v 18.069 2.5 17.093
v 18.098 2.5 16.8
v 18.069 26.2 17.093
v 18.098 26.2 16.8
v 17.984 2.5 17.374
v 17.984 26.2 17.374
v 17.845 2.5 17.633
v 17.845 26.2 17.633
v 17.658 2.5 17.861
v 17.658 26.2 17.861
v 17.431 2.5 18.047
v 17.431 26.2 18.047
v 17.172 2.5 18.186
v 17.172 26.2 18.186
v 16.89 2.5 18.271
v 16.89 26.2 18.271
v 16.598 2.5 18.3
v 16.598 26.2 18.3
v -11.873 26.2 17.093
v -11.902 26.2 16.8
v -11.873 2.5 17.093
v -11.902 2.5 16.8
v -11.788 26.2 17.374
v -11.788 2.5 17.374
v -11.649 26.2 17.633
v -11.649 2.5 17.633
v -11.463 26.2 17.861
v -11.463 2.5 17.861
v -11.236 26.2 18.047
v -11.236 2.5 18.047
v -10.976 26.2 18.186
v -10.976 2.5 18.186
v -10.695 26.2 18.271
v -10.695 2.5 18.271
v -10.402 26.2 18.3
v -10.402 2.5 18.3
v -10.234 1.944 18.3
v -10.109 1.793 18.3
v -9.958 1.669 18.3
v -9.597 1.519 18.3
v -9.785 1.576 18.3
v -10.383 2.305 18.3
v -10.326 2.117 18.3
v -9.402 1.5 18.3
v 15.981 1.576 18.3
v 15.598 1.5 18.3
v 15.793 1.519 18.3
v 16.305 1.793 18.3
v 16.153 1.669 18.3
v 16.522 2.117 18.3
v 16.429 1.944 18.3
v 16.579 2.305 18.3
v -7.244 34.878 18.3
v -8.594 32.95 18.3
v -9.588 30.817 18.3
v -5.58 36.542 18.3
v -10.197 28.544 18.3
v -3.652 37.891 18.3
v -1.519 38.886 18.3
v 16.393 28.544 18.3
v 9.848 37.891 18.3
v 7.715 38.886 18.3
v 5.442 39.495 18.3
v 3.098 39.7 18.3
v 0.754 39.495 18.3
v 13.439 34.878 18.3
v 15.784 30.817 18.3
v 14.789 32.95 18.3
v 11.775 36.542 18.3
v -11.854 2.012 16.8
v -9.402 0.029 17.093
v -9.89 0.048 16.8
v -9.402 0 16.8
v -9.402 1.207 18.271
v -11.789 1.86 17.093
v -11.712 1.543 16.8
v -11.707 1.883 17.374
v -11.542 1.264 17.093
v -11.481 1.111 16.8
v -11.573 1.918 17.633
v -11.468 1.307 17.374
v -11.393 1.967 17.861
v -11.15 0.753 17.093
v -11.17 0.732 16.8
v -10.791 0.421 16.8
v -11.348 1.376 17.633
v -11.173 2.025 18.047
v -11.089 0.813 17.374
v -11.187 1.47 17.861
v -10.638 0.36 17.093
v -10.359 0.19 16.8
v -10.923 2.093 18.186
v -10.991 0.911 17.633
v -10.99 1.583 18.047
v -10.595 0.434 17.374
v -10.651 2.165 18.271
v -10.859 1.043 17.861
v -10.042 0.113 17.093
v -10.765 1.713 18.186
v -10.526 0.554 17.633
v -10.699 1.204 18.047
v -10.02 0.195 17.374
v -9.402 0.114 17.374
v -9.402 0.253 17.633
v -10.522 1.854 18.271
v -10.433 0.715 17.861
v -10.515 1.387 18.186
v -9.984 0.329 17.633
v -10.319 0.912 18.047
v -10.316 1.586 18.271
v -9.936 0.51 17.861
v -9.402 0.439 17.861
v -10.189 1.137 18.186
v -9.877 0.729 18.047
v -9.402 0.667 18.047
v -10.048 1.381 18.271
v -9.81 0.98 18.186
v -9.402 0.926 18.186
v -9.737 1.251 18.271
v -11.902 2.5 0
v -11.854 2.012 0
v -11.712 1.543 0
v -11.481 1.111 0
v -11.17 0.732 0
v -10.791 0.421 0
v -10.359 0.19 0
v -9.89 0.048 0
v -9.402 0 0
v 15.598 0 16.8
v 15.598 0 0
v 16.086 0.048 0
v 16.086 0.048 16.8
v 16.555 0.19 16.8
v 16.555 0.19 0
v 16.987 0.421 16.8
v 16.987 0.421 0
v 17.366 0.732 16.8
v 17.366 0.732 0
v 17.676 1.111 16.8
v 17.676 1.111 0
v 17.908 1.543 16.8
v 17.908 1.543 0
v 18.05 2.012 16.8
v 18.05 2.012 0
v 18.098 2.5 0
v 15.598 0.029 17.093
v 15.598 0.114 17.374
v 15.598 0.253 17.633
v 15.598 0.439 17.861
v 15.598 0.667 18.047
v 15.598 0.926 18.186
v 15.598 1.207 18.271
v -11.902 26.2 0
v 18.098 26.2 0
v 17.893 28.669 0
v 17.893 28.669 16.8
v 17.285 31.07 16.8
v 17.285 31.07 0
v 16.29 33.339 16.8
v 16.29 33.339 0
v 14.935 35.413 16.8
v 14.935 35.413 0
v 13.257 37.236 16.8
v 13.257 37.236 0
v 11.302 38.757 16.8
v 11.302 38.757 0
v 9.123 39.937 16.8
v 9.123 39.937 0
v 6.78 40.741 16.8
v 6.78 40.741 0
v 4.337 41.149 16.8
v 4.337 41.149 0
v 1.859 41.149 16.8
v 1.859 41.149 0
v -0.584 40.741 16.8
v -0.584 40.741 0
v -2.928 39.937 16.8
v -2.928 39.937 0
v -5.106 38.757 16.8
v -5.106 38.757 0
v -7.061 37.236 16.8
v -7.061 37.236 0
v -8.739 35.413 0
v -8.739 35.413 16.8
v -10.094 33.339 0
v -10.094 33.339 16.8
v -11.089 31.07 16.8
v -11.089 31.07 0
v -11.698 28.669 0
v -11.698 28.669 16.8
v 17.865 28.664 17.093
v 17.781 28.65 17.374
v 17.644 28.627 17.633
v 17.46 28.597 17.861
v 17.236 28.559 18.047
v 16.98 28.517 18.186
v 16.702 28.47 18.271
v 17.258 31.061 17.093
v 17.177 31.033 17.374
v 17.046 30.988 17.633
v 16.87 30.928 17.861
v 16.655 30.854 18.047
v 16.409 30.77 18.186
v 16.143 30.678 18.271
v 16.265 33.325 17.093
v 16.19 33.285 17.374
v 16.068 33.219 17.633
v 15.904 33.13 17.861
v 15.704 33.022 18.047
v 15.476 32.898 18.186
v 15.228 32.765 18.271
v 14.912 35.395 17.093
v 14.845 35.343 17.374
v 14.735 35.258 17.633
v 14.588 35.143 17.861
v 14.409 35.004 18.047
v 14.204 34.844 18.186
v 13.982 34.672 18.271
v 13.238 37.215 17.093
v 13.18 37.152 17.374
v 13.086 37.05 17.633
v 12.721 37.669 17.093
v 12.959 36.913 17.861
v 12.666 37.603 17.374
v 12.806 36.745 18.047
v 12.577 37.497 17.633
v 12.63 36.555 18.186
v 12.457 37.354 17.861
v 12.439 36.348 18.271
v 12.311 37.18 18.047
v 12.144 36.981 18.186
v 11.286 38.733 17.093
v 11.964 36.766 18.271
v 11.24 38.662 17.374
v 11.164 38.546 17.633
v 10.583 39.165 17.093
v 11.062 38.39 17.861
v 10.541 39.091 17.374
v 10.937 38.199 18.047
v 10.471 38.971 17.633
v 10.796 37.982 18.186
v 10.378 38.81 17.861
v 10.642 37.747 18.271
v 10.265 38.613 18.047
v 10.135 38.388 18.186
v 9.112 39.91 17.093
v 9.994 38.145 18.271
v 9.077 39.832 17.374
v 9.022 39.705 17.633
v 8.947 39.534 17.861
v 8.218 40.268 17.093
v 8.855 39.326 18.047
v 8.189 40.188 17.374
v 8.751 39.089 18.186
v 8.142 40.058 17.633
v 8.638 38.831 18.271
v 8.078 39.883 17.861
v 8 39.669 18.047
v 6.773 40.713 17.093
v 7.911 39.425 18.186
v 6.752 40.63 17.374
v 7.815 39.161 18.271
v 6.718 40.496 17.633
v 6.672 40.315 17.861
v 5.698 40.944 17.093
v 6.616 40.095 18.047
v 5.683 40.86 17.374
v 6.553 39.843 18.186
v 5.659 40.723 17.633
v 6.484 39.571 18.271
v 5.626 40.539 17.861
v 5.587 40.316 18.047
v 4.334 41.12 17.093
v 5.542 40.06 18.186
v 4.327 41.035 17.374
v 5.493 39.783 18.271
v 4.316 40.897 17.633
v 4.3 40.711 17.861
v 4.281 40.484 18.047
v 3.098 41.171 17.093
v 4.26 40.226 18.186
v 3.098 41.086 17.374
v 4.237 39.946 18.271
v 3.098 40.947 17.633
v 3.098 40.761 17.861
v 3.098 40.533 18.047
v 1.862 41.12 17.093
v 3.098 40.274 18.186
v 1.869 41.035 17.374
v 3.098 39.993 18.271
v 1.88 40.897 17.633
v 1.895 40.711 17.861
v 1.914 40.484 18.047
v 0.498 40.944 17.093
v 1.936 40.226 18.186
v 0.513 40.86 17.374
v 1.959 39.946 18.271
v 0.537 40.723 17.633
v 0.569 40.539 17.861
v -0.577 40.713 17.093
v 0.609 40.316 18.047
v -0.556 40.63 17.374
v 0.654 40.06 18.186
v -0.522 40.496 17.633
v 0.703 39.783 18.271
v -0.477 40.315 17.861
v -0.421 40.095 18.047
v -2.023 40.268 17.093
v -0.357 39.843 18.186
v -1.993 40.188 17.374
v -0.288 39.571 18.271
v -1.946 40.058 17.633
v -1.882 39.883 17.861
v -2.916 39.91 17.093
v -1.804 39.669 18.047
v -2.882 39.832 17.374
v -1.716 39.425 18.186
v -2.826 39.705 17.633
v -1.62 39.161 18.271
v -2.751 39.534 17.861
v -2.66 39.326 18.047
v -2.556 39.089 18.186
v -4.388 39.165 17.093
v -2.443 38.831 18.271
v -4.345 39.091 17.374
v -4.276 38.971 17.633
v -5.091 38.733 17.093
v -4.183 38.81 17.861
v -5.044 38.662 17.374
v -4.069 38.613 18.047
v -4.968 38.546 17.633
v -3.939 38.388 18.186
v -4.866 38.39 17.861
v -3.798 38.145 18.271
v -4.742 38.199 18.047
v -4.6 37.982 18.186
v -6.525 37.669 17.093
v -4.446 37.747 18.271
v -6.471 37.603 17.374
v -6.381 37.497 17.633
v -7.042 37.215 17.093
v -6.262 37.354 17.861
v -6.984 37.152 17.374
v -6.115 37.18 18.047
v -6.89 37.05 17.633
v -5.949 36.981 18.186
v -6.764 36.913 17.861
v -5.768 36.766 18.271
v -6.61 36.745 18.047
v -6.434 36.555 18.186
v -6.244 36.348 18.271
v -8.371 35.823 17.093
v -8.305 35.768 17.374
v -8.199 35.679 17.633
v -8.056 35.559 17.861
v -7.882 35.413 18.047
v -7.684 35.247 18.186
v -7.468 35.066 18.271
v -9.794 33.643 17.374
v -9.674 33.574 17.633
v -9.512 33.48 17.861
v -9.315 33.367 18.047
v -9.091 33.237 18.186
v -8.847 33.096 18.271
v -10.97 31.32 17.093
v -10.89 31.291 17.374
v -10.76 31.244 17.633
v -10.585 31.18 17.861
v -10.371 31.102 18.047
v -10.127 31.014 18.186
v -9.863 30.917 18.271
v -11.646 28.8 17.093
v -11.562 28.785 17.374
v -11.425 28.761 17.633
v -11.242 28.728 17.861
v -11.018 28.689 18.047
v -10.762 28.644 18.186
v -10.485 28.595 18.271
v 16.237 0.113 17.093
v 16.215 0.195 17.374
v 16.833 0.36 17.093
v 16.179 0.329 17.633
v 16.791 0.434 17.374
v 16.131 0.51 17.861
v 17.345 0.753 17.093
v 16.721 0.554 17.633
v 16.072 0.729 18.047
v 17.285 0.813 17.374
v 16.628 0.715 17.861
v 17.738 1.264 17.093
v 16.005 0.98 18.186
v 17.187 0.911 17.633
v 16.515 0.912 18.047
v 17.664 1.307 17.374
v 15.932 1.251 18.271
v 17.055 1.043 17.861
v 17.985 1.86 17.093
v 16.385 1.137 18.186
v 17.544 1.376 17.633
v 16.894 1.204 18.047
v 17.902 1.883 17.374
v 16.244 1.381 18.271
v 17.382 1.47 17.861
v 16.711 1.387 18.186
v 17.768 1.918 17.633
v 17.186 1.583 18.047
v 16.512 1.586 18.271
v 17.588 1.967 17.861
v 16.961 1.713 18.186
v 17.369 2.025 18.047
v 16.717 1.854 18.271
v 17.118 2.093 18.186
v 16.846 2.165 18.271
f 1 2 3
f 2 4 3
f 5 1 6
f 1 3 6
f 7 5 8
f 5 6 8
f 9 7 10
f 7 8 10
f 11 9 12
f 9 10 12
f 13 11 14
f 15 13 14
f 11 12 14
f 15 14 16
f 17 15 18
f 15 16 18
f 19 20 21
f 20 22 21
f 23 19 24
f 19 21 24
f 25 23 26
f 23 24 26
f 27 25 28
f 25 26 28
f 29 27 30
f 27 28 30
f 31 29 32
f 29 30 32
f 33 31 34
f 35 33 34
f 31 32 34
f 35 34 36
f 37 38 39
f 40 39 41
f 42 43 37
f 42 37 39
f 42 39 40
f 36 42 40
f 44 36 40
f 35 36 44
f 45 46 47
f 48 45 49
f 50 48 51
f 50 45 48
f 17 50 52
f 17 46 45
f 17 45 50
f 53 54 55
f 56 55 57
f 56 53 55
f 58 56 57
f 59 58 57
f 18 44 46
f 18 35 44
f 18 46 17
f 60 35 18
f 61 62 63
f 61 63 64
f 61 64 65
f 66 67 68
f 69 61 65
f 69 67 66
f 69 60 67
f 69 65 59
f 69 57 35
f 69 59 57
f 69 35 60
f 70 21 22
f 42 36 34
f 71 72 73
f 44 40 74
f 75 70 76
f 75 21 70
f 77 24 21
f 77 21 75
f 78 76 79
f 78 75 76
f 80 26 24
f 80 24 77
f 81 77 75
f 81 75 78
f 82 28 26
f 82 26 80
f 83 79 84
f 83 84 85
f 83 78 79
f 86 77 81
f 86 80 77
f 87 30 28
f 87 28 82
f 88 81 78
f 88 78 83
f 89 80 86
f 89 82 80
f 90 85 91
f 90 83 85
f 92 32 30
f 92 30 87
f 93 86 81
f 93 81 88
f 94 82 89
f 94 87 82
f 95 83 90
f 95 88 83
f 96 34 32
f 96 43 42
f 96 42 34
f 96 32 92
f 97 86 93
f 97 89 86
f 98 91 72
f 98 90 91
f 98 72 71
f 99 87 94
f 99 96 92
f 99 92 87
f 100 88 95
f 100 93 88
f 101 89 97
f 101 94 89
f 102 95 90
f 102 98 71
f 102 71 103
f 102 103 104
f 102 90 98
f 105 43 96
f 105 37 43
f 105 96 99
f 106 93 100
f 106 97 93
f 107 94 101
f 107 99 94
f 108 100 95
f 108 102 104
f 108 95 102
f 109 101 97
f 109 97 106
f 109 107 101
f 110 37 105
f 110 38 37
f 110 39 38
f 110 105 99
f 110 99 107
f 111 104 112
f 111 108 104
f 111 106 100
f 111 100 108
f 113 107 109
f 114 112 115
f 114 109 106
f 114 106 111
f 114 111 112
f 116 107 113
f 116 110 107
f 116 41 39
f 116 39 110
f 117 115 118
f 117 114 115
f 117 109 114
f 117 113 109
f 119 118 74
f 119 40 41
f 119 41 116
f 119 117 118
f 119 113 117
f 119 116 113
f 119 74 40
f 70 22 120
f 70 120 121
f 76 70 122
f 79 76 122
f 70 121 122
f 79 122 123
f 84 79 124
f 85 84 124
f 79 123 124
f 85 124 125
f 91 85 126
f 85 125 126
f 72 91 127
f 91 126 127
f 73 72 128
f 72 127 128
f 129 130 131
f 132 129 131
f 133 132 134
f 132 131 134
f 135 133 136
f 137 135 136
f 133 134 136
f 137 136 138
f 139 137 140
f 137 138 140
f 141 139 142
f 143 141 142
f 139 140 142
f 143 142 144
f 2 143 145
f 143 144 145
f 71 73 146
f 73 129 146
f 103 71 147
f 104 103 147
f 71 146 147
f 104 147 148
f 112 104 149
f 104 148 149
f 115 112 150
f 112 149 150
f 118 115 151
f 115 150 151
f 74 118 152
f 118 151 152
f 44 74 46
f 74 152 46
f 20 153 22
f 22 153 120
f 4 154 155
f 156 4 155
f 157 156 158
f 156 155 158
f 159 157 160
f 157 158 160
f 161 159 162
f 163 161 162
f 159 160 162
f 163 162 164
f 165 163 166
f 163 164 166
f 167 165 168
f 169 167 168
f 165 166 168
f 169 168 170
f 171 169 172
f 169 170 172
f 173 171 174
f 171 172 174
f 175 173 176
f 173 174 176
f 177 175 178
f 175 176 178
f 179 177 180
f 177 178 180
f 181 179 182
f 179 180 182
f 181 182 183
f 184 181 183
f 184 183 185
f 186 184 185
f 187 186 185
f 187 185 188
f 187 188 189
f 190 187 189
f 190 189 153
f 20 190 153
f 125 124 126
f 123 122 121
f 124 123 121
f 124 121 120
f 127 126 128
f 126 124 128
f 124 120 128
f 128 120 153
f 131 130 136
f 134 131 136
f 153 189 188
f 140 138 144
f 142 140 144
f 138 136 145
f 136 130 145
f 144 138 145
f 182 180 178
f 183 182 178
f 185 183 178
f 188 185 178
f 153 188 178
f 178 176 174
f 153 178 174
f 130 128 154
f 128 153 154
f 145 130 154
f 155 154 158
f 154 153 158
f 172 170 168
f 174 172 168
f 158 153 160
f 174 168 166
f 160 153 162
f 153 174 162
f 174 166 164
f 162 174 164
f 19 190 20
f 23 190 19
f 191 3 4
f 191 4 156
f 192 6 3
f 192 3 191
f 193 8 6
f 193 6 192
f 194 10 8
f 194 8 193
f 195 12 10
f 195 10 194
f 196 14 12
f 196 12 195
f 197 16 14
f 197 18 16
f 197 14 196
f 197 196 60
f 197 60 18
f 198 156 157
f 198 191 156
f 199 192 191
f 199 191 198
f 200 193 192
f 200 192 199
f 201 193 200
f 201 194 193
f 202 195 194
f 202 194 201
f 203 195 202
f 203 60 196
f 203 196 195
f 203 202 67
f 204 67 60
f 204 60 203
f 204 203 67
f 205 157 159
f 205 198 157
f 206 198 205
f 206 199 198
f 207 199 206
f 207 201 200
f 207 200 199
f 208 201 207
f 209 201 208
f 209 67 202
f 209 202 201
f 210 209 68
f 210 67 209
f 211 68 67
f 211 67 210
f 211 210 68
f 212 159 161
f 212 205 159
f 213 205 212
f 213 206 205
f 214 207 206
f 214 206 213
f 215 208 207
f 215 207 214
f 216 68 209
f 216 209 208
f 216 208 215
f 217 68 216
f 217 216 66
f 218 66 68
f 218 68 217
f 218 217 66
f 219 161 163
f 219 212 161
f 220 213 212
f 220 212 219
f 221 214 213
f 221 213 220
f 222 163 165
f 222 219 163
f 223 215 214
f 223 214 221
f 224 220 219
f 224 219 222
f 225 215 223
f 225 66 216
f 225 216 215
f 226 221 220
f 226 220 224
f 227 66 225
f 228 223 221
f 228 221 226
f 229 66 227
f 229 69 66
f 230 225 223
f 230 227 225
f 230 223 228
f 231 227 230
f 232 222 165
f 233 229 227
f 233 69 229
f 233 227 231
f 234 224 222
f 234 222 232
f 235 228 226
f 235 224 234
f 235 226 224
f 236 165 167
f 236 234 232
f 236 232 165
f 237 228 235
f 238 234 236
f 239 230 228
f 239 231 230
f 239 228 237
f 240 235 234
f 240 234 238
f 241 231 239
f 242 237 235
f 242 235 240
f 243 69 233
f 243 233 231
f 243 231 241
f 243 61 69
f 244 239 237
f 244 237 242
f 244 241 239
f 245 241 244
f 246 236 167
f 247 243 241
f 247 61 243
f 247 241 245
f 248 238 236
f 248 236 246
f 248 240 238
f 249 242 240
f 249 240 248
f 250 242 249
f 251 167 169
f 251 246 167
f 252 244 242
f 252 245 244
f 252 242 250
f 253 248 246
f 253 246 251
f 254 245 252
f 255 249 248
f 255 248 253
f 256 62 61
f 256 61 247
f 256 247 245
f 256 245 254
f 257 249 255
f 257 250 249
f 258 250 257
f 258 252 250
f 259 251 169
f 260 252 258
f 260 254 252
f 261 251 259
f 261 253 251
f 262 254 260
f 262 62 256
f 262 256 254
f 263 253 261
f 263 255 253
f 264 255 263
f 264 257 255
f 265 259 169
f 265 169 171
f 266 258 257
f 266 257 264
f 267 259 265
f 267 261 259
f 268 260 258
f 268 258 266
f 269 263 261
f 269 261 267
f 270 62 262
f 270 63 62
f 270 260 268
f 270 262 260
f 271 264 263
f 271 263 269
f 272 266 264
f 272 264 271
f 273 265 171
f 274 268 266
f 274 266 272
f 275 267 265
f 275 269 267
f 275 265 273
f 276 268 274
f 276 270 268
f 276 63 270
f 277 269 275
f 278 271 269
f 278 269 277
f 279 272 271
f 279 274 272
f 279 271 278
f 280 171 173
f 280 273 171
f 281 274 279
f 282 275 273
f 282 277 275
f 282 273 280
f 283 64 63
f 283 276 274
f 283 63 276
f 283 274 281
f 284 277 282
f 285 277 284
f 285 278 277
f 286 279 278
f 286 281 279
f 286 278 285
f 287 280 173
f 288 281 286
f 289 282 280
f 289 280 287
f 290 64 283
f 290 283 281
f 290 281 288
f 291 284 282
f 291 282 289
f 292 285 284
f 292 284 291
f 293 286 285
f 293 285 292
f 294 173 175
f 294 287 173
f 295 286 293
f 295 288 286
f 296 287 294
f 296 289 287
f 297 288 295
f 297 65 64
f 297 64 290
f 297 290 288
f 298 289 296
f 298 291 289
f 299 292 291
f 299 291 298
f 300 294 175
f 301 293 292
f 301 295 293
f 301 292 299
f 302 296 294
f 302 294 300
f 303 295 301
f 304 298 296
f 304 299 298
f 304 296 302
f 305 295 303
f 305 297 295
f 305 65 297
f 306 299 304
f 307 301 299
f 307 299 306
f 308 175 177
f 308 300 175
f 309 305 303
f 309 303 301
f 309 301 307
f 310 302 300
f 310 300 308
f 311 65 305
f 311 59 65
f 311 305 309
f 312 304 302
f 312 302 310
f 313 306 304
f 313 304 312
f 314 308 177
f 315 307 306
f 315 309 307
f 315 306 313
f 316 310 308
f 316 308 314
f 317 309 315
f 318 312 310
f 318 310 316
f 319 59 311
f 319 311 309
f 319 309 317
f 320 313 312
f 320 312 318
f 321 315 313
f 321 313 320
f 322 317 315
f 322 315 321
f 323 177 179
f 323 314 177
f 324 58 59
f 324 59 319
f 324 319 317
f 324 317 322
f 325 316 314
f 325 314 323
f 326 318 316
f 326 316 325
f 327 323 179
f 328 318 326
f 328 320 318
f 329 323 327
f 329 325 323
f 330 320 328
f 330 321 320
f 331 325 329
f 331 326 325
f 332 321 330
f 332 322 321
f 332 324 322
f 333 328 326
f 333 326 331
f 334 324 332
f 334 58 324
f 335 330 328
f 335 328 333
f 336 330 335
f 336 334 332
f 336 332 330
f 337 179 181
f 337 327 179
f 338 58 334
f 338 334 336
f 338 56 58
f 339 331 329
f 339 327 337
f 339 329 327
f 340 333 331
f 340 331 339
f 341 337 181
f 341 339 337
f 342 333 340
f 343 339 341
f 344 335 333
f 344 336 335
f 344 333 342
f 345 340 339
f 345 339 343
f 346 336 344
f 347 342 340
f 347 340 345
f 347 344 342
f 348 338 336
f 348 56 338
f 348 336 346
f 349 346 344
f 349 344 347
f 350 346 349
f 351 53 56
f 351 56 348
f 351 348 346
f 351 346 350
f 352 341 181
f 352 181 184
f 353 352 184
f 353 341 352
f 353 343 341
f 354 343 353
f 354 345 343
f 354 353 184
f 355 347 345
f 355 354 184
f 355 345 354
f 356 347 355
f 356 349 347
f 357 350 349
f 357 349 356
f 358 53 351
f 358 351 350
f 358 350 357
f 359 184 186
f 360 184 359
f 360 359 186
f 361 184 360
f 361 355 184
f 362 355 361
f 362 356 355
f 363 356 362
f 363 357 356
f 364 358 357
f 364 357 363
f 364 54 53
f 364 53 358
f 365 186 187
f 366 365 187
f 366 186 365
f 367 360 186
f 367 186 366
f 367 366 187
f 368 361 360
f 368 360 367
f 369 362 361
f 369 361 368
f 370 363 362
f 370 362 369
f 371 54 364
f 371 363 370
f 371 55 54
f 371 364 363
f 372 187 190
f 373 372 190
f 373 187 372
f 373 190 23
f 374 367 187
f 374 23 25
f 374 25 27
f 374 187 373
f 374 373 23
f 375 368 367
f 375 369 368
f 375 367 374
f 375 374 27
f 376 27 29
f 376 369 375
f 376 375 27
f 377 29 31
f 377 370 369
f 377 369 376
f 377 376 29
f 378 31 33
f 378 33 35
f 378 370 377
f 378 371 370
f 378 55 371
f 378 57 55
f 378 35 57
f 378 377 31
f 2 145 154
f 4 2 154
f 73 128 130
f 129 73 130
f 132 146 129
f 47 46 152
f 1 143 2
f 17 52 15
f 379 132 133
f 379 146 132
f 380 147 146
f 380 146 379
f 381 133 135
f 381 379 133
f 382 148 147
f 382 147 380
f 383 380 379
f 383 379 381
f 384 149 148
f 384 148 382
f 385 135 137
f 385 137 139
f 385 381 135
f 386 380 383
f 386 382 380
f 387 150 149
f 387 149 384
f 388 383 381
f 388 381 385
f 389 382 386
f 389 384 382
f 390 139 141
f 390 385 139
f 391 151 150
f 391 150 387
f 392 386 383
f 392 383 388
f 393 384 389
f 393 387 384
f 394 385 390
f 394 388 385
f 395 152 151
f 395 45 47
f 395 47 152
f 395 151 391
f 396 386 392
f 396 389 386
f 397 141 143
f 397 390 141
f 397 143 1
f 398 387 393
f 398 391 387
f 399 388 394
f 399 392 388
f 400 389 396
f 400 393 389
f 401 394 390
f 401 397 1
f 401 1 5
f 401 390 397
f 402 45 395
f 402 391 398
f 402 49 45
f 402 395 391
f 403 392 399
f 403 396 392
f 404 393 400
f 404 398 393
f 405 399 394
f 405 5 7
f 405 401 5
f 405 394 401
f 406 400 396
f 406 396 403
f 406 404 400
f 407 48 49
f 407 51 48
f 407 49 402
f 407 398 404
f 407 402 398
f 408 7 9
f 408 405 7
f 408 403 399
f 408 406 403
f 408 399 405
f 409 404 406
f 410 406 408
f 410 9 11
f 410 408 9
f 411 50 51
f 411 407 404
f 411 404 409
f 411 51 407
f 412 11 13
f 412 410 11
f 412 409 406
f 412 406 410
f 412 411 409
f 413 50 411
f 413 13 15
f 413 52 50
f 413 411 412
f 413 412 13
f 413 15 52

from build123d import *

# Parameters (mm, degrees)
F1_DEPTH = 18.3
F2_R     = 1.5


with BuildPart() as f1:
    # F0 (on Top) → F1 (new body)
    with BuildSketch(Plane.XY):
        with BuildLine():
            ThreePointArc((-11.902175, 2.5), (-11.169942, 0.732233), (-9.402175, 0))
            Line((-9.402175, 0), (15.597825, 0))
            ThreePointArc((15.597825, 0), (17.365592, 0.732233), (18.097825, 2.5))
            Line((18.097825, 2.5), (18.097825, 26.2))
            ThreePointArc((18.097825, 26.2), (3.097825, 41.2), (-11.902175, 26.2))
            Line((-11.902175, 26.2), (-11.902175, 2.5))
        make_face()
    extrude(amount=F1_DEPTH)

    # F2
    f2_edges = [f1.edges().sort_by_distance(p)[0] for p in [
        (-11.902175, 14.35, 18.3),
        (-11.169942, 0.732233, 18.3),
        (3.097825, 0, 18.3),
        (17.365592, 0.732233, 18.3),
        (18.097825, 14.35, 18.3),
        (3.097825, 41.2, 18.3),
    ]]
    fillet(f2_edges, radius=F2_R)


solid = f1.part
